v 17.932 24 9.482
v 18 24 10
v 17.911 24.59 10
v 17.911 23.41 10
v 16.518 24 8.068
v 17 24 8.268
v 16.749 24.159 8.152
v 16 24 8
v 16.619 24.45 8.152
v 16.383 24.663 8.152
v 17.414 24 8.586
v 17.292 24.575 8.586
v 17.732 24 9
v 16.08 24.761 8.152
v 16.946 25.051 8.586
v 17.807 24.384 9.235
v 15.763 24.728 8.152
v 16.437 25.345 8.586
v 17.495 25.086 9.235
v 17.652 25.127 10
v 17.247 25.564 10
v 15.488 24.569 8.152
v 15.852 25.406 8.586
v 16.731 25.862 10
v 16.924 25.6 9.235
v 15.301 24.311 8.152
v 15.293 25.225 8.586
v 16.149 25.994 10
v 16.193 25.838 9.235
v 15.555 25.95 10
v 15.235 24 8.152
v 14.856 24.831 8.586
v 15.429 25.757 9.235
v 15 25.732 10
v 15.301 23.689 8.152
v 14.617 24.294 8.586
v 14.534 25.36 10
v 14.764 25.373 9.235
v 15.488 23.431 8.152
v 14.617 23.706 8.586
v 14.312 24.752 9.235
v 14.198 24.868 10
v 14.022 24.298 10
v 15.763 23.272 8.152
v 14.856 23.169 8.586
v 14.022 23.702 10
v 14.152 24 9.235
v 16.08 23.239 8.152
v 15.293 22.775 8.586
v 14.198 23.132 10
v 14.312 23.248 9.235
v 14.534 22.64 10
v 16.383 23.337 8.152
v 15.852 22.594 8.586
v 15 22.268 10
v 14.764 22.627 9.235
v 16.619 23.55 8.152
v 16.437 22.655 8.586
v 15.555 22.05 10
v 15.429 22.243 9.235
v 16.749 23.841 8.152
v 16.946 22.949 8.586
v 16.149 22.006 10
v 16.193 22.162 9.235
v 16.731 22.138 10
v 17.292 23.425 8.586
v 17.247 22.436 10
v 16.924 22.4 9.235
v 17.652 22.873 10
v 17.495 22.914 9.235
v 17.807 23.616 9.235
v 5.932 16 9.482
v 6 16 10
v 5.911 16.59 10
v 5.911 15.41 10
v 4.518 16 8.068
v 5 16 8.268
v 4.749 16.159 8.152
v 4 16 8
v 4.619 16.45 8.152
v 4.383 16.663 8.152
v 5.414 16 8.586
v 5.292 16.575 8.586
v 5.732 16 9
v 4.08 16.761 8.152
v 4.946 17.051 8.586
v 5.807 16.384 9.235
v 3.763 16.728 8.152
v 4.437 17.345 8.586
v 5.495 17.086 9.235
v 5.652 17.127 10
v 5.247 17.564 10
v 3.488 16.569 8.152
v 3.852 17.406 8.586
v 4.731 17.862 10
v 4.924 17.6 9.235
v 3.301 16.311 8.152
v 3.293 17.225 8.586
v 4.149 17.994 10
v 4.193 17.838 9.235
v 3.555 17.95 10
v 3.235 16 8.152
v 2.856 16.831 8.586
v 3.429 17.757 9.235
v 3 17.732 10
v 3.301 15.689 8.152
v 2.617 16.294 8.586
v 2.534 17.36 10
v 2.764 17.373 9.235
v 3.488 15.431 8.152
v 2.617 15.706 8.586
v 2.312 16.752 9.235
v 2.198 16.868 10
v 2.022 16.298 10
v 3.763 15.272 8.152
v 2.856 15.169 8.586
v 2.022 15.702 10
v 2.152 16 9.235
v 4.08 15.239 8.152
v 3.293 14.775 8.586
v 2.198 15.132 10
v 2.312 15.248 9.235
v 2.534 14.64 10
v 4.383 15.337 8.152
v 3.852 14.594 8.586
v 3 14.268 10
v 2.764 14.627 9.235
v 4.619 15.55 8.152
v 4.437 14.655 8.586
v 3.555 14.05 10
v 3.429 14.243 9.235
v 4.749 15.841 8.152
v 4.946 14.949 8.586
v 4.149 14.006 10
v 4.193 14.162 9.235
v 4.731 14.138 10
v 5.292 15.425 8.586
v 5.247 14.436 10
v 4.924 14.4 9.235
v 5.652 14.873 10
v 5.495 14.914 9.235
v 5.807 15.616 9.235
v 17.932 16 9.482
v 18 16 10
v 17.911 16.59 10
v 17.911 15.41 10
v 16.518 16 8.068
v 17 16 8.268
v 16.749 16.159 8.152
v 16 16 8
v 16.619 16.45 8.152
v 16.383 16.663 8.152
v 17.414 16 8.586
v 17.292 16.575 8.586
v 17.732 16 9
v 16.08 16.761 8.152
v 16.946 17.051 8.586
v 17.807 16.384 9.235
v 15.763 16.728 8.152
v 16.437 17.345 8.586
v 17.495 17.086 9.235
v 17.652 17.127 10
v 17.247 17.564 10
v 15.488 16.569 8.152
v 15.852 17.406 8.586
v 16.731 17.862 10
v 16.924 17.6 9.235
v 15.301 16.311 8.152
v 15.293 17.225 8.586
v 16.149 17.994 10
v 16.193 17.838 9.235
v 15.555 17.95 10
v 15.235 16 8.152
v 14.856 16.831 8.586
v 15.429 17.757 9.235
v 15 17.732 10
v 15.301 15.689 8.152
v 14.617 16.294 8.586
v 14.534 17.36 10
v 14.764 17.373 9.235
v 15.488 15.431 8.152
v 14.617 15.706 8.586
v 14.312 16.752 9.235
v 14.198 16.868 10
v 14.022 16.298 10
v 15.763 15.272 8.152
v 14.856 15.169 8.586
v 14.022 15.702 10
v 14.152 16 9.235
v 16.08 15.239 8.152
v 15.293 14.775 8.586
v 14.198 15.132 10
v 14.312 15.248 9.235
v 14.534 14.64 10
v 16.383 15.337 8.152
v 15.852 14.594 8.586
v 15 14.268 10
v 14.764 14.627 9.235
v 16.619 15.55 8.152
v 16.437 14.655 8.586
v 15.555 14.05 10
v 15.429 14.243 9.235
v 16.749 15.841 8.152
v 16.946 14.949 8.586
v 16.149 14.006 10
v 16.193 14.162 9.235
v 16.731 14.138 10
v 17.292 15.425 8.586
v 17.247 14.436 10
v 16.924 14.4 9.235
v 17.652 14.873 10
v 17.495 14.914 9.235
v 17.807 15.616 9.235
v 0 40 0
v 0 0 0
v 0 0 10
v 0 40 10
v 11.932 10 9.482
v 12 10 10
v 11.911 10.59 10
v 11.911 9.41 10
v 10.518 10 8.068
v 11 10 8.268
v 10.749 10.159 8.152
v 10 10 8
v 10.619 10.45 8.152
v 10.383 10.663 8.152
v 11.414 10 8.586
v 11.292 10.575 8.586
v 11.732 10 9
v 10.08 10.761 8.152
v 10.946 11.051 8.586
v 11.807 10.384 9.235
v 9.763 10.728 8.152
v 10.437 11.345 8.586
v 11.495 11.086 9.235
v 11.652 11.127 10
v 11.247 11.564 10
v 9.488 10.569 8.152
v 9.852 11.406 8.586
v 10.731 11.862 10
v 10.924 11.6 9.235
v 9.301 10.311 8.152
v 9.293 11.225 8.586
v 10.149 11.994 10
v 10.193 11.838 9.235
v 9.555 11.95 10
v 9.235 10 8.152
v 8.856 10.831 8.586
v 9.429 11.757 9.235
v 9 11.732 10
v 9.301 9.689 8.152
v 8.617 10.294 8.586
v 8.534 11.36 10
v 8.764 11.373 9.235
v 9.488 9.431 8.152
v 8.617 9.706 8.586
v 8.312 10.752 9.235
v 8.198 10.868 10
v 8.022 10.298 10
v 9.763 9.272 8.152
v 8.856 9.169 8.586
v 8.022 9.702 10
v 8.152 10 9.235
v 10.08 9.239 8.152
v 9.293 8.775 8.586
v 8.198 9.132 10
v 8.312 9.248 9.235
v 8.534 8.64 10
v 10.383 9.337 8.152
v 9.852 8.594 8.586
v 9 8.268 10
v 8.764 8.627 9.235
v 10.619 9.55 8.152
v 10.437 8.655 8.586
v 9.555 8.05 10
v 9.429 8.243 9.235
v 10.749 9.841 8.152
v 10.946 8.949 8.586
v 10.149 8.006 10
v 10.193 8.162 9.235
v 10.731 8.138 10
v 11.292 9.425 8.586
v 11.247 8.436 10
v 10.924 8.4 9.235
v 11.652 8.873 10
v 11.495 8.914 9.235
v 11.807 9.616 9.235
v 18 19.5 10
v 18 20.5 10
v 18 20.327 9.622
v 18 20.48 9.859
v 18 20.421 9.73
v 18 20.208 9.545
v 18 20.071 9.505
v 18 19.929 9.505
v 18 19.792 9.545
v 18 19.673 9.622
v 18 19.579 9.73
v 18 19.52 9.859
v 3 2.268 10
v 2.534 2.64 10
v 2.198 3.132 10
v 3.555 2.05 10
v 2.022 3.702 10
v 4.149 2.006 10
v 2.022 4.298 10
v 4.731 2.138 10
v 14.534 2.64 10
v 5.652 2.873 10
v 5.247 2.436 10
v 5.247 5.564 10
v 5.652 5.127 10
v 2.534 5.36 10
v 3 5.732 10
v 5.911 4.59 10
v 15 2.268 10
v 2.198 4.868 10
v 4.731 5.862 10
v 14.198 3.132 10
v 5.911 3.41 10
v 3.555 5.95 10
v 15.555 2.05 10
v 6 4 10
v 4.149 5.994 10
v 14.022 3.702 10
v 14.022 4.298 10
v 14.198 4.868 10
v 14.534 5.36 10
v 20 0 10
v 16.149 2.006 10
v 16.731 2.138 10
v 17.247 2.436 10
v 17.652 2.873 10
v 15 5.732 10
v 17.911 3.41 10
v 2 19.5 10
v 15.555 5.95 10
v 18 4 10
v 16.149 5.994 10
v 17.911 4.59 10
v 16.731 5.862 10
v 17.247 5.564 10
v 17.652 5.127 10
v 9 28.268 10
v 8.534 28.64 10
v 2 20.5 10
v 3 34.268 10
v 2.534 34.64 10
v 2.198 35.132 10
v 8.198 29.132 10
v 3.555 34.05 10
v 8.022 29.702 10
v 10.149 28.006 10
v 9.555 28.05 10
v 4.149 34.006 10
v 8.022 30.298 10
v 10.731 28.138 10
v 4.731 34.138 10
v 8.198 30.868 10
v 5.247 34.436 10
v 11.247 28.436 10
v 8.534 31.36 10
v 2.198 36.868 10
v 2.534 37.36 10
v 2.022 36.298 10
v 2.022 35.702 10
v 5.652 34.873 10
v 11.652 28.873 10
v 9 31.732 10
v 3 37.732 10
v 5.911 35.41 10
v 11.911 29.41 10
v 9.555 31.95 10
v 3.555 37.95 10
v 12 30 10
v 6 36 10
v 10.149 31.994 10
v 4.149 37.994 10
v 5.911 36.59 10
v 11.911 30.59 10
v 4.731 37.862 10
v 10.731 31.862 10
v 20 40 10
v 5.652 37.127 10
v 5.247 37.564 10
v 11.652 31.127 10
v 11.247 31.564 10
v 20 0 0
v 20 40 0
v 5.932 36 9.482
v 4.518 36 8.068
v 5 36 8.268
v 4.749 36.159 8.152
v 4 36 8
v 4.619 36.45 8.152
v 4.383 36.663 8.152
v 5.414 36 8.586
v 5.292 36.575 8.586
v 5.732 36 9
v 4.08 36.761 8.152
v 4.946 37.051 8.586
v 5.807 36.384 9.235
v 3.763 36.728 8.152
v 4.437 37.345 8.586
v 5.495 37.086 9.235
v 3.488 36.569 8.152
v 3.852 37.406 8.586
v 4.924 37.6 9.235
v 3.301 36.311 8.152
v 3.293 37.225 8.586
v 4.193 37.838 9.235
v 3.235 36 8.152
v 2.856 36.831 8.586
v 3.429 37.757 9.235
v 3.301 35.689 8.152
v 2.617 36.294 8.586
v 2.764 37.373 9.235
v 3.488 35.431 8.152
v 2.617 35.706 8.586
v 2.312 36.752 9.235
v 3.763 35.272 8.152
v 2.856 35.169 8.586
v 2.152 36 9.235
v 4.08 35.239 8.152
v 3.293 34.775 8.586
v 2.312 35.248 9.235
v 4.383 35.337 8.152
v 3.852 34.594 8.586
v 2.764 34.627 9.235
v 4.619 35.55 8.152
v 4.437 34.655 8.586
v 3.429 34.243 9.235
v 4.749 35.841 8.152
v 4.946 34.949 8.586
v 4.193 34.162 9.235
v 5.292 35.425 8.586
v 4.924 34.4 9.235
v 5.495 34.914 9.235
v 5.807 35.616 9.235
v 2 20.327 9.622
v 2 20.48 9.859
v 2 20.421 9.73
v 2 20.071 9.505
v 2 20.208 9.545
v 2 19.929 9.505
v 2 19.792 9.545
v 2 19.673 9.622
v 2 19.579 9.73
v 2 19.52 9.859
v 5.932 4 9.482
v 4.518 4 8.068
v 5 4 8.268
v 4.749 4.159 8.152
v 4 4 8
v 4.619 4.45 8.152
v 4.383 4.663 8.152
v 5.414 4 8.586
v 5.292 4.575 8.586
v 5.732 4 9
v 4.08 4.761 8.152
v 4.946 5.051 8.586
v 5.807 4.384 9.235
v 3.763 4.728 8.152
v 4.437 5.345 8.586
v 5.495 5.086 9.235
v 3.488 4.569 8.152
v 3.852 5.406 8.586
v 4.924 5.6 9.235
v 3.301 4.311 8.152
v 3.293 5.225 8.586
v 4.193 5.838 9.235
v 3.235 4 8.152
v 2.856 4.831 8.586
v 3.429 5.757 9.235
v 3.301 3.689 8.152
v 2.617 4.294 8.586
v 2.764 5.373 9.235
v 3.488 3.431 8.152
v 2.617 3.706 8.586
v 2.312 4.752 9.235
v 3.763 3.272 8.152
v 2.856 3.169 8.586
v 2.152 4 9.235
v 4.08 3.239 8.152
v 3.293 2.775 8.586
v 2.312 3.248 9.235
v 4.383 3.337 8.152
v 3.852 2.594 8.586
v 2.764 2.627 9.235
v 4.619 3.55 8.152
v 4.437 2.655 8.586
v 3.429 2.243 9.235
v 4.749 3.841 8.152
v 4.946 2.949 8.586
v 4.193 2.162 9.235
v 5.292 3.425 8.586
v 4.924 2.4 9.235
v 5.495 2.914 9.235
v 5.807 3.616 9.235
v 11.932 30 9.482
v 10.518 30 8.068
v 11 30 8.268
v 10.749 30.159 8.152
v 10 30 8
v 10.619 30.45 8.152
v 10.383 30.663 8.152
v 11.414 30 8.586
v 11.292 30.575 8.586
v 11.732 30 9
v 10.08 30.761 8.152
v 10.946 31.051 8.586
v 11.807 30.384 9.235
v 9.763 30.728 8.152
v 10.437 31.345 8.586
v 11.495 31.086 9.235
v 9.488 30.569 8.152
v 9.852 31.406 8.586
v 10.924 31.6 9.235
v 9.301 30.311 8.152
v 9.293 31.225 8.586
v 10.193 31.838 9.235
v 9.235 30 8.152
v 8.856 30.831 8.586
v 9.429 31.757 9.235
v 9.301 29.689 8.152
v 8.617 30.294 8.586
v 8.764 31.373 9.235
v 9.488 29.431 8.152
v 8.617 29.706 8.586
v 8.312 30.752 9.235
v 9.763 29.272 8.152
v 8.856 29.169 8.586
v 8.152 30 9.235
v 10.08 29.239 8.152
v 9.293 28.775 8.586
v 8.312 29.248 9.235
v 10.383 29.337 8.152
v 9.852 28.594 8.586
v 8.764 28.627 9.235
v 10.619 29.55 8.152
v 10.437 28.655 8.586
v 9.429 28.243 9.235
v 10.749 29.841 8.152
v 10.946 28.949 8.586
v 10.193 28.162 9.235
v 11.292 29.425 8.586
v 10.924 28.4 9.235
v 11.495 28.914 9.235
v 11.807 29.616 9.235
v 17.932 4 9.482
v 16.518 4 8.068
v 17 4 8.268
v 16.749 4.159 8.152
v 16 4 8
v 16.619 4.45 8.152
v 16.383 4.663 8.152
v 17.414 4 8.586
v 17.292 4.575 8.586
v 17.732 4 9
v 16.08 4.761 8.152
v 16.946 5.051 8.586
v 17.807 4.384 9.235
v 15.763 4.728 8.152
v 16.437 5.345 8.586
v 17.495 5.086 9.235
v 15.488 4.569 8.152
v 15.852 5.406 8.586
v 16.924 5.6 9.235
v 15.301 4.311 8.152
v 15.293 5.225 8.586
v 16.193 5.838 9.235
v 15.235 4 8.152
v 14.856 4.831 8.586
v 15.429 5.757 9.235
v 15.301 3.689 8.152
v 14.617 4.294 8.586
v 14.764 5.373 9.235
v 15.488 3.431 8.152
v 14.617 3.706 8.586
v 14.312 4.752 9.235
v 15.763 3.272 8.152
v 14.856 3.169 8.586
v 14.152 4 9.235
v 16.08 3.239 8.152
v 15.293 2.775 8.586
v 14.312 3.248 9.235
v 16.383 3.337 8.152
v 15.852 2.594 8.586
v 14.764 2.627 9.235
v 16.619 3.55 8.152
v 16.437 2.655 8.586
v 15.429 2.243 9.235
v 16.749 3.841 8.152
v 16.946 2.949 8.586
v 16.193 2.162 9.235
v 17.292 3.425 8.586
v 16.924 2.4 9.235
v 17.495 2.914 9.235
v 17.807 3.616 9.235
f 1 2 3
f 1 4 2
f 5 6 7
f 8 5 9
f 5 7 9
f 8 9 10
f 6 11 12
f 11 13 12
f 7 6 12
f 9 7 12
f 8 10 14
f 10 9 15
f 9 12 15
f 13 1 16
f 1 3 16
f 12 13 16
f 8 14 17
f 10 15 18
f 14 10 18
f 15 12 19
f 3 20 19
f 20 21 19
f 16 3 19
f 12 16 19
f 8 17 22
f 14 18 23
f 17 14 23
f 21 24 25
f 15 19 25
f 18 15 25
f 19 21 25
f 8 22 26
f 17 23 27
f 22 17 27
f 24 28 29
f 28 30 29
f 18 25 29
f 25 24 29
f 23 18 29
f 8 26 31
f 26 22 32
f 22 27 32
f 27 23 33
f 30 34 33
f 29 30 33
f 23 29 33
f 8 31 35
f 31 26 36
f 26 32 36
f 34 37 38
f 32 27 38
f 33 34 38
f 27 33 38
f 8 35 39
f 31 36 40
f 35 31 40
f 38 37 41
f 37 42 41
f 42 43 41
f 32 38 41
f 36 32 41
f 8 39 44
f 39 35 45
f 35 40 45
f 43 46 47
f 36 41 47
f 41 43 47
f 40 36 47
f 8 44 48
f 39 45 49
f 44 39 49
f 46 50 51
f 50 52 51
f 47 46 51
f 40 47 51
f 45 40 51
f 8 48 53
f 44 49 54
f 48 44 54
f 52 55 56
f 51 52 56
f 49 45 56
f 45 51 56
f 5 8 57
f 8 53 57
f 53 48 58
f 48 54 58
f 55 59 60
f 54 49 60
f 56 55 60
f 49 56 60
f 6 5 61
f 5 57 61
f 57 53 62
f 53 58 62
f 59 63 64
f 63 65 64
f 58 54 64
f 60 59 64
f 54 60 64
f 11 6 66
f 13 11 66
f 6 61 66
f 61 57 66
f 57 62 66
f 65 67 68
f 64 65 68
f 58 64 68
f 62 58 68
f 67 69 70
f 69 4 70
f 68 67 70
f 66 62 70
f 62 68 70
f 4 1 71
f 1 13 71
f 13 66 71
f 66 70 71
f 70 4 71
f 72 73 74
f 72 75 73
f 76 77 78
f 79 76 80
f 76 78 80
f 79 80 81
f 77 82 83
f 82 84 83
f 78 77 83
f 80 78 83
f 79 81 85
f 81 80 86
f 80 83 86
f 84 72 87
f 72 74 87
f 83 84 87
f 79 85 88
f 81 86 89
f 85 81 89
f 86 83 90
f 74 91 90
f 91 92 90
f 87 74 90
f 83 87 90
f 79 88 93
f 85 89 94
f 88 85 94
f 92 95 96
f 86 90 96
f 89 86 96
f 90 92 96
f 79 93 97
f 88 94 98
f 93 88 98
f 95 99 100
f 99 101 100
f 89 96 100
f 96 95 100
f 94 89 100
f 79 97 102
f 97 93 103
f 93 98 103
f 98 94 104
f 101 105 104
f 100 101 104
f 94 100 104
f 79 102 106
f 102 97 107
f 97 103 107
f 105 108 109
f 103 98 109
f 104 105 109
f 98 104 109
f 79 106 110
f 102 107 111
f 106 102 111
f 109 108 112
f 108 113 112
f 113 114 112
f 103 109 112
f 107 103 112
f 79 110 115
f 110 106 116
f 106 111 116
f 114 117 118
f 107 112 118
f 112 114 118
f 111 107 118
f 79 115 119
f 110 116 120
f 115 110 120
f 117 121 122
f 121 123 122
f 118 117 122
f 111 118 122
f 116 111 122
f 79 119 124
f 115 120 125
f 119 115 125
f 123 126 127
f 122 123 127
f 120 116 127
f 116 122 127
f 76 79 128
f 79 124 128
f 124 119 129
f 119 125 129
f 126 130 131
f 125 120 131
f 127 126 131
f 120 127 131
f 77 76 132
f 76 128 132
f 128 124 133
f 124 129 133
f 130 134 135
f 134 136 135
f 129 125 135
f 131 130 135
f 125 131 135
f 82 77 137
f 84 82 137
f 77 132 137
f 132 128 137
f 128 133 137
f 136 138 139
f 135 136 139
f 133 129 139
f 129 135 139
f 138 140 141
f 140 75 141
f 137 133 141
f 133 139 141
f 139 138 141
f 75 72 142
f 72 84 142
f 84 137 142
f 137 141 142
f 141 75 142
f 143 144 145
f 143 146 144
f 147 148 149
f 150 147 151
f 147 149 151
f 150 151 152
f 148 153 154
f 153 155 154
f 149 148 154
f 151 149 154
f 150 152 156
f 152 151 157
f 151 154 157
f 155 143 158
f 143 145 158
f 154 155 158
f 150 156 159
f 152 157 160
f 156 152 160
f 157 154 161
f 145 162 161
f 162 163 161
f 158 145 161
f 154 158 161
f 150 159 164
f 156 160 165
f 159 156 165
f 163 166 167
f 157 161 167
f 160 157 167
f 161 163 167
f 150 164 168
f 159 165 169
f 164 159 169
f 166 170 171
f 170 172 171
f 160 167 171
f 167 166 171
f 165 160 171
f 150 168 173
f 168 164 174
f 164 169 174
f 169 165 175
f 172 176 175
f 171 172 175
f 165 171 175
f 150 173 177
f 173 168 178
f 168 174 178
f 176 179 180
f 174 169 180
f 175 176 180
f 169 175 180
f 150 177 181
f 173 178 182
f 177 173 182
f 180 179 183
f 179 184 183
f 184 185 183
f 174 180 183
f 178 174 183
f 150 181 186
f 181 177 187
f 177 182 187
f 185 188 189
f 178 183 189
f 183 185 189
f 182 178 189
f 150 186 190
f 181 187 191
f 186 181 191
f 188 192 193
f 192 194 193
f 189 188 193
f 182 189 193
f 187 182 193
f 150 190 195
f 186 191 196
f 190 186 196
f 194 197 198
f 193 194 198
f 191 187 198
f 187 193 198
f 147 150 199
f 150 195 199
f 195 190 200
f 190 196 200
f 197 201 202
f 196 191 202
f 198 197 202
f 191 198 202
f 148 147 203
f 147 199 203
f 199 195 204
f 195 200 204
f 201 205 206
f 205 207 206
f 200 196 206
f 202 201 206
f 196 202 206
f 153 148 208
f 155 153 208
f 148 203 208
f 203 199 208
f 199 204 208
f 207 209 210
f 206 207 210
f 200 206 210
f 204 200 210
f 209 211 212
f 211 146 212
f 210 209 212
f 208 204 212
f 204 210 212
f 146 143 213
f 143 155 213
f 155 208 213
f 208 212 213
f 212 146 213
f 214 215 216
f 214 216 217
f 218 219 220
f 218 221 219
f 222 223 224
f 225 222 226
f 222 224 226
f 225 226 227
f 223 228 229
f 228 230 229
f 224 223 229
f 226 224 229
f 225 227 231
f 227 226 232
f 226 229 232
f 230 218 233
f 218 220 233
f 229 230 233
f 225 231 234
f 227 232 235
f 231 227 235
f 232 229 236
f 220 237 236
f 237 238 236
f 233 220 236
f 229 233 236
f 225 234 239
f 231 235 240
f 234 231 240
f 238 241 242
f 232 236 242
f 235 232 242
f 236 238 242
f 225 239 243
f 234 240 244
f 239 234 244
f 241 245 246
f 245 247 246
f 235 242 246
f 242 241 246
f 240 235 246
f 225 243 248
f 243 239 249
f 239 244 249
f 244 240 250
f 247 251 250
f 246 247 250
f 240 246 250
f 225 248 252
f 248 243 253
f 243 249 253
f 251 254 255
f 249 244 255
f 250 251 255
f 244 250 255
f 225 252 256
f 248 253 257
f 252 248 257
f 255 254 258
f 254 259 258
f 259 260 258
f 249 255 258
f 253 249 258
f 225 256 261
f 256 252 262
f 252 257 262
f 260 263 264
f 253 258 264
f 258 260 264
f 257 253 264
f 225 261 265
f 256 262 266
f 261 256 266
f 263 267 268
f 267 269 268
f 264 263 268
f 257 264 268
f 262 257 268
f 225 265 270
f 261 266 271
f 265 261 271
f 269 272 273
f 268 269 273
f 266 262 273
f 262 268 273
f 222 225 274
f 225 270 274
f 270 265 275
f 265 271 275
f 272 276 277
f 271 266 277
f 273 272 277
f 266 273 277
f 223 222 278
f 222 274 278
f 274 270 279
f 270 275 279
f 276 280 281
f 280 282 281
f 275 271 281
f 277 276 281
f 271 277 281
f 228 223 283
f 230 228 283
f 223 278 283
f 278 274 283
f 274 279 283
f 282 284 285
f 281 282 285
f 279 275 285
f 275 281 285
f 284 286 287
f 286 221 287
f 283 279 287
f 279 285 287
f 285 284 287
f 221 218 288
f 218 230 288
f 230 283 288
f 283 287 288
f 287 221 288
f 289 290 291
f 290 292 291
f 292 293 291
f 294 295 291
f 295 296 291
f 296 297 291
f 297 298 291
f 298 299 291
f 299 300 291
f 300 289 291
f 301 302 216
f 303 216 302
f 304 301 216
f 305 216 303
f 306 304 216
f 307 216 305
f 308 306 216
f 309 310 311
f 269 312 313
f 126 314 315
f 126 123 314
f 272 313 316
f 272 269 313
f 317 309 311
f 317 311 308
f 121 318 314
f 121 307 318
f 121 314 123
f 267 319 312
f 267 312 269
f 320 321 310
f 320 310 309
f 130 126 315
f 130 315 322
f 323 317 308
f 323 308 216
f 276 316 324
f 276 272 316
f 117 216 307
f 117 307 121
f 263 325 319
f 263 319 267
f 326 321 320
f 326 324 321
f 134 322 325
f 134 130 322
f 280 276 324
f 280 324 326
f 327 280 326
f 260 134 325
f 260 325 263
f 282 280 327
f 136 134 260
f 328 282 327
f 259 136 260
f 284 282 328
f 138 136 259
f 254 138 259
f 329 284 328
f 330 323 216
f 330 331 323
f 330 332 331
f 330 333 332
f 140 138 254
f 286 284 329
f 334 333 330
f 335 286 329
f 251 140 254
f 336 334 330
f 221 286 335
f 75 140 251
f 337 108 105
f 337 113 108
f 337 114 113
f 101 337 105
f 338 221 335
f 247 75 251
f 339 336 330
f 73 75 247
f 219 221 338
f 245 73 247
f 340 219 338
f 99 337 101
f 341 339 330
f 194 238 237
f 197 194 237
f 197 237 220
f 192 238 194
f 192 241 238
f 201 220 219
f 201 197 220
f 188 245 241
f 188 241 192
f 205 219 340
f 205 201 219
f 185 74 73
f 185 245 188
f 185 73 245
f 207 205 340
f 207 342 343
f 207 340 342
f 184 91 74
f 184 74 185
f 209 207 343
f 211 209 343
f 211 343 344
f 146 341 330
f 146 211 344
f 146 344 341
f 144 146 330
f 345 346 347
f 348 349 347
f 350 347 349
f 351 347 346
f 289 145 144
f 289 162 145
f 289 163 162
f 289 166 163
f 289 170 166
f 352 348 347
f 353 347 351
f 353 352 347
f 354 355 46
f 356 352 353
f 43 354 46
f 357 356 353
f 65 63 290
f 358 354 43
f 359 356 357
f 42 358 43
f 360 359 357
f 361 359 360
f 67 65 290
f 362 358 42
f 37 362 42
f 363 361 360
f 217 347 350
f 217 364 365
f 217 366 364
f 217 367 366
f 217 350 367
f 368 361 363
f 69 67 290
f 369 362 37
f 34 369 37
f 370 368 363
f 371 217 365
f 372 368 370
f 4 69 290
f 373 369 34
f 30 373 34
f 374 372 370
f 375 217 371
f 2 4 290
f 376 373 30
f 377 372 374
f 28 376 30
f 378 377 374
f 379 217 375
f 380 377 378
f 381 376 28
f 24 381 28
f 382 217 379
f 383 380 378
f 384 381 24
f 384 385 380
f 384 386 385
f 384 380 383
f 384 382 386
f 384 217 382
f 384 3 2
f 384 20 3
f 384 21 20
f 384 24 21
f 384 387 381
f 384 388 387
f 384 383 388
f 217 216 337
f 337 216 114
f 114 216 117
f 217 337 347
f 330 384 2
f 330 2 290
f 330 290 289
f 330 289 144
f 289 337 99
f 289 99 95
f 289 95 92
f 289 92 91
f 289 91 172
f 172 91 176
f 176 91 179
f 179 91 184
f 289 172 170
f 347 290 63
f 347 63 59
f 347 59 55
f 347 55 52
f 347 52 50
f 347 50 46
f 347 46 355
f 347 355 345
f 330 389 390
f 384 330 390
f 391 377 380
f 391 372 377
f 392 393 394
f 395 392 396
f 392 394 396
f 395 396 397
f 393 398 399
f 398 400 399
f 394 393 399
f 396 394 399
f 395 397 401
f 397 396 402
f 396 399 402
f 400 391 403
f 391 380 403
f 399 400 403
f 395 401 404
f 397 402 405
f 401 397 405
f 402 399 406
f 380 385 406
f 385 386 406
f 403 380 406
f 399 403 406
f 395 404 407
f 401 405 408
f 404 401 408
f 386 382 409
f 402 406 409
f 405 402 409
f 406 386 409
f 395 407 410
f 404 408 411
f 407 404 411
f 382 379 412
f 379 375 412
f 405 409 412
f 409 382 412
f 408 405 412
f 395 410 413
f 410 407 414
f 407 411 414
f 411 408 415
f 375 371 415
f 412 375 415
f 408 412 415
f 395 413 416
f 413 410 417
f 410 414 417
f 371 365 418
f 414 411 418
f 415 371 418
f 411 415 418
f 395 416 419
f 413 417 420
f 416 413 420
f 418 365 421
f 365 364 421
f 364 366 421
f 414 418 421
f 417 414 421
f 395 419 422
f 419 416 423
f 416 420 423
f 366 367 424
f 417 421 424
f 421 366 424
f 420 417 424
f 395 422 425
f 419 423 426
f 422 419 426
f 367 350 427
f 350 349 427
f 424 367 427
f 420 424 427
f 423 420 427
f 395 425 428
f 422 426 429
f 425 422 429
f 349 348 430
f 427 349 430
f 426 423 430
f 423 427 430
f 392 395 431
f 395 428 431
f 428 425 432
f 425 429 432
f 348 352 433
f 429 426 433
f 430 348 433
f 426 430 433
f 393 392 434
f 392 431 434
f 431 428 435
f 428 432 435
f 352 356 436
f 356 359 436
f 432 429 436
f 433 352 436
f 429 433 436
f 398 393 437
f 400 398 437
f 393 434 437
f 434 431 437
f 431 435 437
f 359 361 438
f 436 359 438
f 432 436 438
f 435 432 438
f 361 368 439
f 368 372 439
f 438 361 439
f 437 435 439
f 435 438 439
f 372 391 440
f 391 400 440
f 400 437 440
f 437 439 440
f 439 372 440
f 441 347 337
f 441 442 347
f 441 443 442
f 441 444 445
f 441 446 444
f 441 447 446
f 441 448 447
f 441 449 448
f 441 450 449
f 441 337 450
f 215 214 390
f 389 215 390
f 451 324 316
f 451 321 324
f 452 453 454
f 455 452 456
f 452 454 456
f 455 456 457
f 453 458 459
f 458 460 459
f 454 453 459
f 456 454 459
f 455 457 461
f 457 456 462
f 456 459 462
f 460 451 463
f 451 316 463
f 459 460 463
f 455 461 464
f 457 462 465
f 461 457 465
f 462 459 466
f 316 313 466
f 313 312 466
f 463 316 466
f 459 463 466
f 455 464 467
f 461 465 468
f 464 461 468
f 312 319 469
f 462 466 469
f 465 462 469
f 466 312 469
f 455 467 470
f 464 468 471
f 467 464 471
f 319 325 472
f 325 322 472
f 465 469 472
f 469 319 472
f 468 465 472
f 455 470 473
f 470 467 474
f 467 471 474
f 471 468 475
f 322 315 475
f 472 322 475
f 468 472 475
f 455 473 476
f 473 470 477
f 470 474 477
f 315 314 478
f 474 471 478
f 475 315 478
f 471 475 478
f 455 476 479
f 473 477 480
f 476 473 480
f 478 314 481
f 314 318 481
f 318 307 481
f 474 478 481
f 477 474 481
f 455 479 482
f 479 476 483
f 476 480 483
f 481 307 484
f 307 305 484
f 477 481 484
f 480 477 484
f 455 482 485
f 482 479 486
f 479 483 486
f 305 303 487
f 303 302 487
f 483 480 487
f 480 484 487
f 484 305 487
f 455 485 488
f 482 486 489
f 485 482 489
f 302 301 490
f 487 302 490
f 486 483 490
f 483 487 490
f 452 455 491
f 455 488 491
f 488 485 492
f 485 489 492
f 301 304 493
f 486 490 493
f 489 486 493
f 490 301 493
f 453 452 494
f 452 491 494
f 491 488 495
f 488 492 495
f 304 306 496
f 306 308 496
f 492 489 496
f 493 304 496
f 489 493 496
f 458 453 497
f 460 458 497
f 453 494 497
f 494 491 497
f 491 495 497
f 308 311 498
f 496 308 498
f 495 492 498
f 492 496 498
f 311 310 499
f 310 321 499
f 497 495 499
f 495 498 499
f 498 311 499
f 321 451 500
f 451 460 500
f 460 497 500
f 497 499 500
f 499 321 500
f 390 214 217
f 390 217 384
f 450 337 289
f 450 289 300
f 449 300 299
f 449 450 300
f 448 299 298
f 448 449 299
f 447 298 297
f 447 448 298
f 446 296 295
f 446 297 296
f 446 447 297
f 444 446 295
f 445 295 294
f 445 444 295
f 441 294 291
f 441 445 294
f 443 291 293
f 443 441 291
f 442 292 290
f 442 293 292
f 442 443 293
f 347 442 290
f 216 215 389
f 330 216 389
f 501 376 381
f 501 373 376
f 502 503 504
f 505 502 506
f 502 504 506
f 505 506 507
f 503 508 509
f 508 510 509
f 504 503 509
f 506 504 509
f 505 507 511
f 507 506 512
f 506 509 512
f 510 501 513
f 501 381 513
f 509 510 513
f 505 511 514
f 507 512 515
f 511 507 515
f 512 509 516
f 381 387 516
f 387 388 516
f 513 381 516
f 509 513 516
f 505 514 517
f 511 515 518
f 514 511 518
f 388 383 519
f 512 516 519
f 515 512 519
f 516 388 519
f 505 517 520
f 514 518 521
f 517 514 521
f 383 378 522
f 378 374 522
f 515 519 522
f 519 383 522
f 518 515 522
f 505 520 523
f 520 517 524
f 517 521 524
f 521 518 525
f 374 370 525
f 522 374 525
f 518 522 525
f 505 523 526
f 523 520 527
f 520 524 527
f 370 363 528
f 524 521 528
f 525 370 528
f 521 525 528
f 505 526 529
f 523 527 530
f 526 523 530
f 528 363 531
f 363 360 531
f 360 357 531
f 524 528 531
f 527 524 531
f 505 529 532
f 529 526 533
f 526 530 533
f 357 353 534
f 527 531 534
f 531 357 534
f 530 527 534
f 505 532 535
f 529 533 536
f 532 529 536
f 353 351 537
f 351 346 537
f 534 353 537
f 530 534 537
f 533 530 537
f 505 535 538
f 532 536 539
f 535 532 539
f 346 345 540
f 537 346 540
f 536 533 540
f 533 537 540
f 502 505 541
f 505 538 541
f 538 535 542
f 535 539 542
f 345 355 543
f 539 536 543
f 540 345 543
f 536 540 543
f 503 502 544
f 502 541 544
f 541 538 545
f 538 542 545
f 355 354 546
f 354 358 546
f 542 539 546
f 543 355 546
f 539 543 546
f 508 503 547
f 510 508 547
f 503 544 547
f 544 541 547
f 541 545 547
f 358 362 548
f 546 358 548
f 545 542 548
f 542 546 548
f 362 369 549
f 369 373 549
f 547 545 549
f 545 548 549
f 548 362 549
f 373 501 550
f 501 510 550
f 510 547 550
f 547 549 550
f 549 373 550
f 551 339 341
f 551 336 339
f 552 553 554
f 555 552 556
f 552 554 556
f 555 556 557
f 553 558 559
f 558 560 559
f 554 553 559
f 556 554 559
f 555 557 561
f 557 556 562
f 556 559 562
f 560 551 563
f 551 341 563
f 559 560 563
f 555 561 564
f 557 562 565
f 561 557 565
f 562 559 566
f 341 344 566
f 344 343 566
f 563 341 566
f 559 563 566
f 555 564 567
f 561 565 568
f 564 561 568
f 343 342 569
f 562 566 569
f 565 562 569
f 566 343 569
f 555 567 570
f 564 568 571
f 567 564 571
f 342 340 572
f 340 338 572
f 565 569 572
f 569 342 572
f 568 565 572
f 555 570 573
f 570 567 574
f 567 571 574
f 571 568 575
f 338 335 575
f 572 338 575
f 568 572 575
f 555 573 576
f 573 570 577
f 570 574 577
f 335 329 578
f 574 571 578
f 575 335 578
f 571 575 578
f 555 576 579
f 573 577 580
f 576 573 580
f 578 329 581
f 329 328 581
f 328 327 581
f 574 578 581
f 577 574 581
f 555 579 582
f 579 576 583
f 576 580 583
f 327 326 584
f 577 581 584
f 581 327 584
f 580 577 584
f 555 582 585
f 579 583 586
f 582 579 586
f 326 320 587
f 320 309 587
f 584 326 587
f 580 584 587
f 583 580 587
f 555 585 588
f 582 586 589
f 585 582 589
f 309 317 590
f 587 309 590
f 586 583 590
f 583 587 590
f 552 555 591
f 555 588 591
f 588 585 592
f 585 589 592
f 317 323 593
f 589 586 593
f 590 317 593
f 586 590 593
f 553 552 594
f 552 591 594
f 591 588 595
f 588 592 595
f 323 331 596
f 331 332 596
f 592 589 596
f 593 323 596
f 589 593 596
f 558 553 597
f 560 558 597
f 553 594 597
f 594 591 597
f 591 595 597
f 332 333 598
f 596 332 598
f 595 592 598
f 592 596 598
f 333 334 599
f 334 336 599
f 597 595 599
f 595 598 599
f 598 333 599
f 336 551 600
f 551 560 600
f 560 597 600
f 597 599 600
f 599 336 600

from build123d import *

# Parameters (mm, degrees)
CYLINDER_R     = 0.5
CYLINDER_DEPTH = 16
BOX_W          = 20
BOX_H          = 40
BOX_DEPTH      = 10


with BuildPart() as esfera:
    # Sphere → Sphere (revolve)
    with BuildSketch(Plane(origin=(4, 4, 10), x_dir=(1, 0, 0), z_dir=(0, -1, 0))):
        with BuildLine():
            ThreePointArc((0, -2), (2, 0), (0, 2))
            Line((0, 2), (0, -2))
        make_face()
    revolve(axis=Axis((4, 4, 10), (0, 0, 1)))


with BuildPart() as esfera001:
    # Sphere001 → Sphere001 (revolve)
    with BuildSketch(Plane(origin=(16, 4, 10), x_dir=(1, 0, 0), z_dir=(0, -1, 0))):
        with BuildLine():
            ThreePointArc((0, -2), (2, 0), (0, 2))
            Line((0, 2), (0, -2))
        make_face()
    revolve(axis=Axis((16, 4, 10), (0, 0, 1)))


with BuildPart() as esfera002:
    # Sphere002 → Sphere002 (revolve)
    with BuildSketch(Plane(origin=(10, 10, 10), x_dir=(1, 0, 0), z_dir=(0, -1, 0))):
        with BuildLine():
            ThreePointArc((0, -2), (2, 0), (0, 2))
            Line((0, 2), (0, -2))
        make_face()
    revolve(axis=Axis((10, 10, 10), (0, 0, 1)))


with BuildPart() as esfera003:
    # Sphere003 → Sphere003 (revolve)
    with BuildSketch(Plane(origin=(4, 16, 10), x_dir=(1, 0, 0), z_dir=(0, -1, 0))):
        with BuildLine():
            ThreePointArc((0, -2), (2, 0), (0, 2))
            Line((0, 2), (0, -2))
        make_face()
    revolve(axis=Axis((4, 16, 10), (0, 0, 1)))


with BuildPart() as esfera004:
    # Sphere004 → Sphere004 (revolve)
    with BuildSketch(Plane(origin=(16, 16, 10), x_dir=(1, 0, 0), z_dir=(0, -1, 0))):
        with BuildLine():
            ThreePointArc((0, -2), (2, 0), (0, 2))
            Line((0, 2), (0, -2))
        make_face()
    revolve(axis=Axis((16, 16, 10), (0, 0, 1)))


with BuildPart() as cilindre:
    # Cylinder → Cylinder (new body)
    with BuildSketch(Plane(origin=(2, 20, 10), x_dir=(0, 0, -1), z_dir=(1, 0, 0))):
        Circle(CYLINDER_R)
    extrude(amount=CYLINDER_DEPTH)


with BuildPart() as esfera007:
    # Sphere007 → Sphere007 (revolve)
    with BuildSketch(Plane(origin=(16, 24, 10), x_dir=(1, 0, 0), z_dir=(0, -1, 0))):
        with BuildLine():
            ThreePointArc((0, -2), (2, 0), (0, 2))
            Line((0, 2), (0, -2))
        make_face()
    revolve(axis=Axis((16, 24, 10), (0, 0, 1)))


with BuildPart() as esfera006:
    # Sphere006 → Sphere006 (revolve)
    with BuildSketch(Plane(origin=(10, 30, 10), x_dir=(1, 0, 0), z_dir=(0, -1, 0))):
        with BuildLine():
            ThreePointArc((0, -2), (2, 0), (0, 2))
            Line((0, 2), (0, -2))
        make_face()
    revolve(axis=Axis((10, 30, 10), (0, 0, 1)))


with BuildPart() as esfera005:
    # Sphere005 → Sphere005 (revolve)
    with BuildSketch(Plane(origin=(4, 36, 10), x_dir=(1, 0, 0), z_dir=(0, -1, 0))):
        with BuildLine():
            ThreePointArc((0, -2), (2, 0), (0, 2))
            Line((0, 2), (0, -2))
        make_face()
    revolve(axis=Axis((4, 36, 10), (0, 0, 1)))


with BuildPart() as cut008:
    # Box → Box (new body)
    with BuildSketch(Plane.XY):
        with Locations((10, 20)):
            Rectangle(BOX_W, BOX_H)
    extrude(amount=BOX_DEPTH)

    # Cut: cut Esfera005
    add(esfera005.part, mode=Mode.SUBTRACT)

    # Cut001: cut Esfera006
    add(esfera006.part, mode=Mode.SUBTRACT)

    # Cut002: cut Esfera007
    add(esfera007.part, mode=Mode.SUBTRACT)

    # Cut003: cut Cilindre
    add(cilindre.part, mode=Mode.SUBTRACT)

    # Cut004: cut Esfera004
    add(esfera004.part, mode=Mode.SUBTRACT)

    # Cut005: cut Esfera003
    add(esfera003.part, mode=Mode.SUBTRACT)

    # Cut006: cut Esfera002
    add(esfera002.part, mode=Mode.SUBTRACT)

    # Cut007: cut Esfera001
    add(esfera001.part, mode=Mode.SUBTRACT)

    # Cut008: cut Esfera
    add(esfera.part, mode=Mode.SUBTRACT)


solid = cut008.part
